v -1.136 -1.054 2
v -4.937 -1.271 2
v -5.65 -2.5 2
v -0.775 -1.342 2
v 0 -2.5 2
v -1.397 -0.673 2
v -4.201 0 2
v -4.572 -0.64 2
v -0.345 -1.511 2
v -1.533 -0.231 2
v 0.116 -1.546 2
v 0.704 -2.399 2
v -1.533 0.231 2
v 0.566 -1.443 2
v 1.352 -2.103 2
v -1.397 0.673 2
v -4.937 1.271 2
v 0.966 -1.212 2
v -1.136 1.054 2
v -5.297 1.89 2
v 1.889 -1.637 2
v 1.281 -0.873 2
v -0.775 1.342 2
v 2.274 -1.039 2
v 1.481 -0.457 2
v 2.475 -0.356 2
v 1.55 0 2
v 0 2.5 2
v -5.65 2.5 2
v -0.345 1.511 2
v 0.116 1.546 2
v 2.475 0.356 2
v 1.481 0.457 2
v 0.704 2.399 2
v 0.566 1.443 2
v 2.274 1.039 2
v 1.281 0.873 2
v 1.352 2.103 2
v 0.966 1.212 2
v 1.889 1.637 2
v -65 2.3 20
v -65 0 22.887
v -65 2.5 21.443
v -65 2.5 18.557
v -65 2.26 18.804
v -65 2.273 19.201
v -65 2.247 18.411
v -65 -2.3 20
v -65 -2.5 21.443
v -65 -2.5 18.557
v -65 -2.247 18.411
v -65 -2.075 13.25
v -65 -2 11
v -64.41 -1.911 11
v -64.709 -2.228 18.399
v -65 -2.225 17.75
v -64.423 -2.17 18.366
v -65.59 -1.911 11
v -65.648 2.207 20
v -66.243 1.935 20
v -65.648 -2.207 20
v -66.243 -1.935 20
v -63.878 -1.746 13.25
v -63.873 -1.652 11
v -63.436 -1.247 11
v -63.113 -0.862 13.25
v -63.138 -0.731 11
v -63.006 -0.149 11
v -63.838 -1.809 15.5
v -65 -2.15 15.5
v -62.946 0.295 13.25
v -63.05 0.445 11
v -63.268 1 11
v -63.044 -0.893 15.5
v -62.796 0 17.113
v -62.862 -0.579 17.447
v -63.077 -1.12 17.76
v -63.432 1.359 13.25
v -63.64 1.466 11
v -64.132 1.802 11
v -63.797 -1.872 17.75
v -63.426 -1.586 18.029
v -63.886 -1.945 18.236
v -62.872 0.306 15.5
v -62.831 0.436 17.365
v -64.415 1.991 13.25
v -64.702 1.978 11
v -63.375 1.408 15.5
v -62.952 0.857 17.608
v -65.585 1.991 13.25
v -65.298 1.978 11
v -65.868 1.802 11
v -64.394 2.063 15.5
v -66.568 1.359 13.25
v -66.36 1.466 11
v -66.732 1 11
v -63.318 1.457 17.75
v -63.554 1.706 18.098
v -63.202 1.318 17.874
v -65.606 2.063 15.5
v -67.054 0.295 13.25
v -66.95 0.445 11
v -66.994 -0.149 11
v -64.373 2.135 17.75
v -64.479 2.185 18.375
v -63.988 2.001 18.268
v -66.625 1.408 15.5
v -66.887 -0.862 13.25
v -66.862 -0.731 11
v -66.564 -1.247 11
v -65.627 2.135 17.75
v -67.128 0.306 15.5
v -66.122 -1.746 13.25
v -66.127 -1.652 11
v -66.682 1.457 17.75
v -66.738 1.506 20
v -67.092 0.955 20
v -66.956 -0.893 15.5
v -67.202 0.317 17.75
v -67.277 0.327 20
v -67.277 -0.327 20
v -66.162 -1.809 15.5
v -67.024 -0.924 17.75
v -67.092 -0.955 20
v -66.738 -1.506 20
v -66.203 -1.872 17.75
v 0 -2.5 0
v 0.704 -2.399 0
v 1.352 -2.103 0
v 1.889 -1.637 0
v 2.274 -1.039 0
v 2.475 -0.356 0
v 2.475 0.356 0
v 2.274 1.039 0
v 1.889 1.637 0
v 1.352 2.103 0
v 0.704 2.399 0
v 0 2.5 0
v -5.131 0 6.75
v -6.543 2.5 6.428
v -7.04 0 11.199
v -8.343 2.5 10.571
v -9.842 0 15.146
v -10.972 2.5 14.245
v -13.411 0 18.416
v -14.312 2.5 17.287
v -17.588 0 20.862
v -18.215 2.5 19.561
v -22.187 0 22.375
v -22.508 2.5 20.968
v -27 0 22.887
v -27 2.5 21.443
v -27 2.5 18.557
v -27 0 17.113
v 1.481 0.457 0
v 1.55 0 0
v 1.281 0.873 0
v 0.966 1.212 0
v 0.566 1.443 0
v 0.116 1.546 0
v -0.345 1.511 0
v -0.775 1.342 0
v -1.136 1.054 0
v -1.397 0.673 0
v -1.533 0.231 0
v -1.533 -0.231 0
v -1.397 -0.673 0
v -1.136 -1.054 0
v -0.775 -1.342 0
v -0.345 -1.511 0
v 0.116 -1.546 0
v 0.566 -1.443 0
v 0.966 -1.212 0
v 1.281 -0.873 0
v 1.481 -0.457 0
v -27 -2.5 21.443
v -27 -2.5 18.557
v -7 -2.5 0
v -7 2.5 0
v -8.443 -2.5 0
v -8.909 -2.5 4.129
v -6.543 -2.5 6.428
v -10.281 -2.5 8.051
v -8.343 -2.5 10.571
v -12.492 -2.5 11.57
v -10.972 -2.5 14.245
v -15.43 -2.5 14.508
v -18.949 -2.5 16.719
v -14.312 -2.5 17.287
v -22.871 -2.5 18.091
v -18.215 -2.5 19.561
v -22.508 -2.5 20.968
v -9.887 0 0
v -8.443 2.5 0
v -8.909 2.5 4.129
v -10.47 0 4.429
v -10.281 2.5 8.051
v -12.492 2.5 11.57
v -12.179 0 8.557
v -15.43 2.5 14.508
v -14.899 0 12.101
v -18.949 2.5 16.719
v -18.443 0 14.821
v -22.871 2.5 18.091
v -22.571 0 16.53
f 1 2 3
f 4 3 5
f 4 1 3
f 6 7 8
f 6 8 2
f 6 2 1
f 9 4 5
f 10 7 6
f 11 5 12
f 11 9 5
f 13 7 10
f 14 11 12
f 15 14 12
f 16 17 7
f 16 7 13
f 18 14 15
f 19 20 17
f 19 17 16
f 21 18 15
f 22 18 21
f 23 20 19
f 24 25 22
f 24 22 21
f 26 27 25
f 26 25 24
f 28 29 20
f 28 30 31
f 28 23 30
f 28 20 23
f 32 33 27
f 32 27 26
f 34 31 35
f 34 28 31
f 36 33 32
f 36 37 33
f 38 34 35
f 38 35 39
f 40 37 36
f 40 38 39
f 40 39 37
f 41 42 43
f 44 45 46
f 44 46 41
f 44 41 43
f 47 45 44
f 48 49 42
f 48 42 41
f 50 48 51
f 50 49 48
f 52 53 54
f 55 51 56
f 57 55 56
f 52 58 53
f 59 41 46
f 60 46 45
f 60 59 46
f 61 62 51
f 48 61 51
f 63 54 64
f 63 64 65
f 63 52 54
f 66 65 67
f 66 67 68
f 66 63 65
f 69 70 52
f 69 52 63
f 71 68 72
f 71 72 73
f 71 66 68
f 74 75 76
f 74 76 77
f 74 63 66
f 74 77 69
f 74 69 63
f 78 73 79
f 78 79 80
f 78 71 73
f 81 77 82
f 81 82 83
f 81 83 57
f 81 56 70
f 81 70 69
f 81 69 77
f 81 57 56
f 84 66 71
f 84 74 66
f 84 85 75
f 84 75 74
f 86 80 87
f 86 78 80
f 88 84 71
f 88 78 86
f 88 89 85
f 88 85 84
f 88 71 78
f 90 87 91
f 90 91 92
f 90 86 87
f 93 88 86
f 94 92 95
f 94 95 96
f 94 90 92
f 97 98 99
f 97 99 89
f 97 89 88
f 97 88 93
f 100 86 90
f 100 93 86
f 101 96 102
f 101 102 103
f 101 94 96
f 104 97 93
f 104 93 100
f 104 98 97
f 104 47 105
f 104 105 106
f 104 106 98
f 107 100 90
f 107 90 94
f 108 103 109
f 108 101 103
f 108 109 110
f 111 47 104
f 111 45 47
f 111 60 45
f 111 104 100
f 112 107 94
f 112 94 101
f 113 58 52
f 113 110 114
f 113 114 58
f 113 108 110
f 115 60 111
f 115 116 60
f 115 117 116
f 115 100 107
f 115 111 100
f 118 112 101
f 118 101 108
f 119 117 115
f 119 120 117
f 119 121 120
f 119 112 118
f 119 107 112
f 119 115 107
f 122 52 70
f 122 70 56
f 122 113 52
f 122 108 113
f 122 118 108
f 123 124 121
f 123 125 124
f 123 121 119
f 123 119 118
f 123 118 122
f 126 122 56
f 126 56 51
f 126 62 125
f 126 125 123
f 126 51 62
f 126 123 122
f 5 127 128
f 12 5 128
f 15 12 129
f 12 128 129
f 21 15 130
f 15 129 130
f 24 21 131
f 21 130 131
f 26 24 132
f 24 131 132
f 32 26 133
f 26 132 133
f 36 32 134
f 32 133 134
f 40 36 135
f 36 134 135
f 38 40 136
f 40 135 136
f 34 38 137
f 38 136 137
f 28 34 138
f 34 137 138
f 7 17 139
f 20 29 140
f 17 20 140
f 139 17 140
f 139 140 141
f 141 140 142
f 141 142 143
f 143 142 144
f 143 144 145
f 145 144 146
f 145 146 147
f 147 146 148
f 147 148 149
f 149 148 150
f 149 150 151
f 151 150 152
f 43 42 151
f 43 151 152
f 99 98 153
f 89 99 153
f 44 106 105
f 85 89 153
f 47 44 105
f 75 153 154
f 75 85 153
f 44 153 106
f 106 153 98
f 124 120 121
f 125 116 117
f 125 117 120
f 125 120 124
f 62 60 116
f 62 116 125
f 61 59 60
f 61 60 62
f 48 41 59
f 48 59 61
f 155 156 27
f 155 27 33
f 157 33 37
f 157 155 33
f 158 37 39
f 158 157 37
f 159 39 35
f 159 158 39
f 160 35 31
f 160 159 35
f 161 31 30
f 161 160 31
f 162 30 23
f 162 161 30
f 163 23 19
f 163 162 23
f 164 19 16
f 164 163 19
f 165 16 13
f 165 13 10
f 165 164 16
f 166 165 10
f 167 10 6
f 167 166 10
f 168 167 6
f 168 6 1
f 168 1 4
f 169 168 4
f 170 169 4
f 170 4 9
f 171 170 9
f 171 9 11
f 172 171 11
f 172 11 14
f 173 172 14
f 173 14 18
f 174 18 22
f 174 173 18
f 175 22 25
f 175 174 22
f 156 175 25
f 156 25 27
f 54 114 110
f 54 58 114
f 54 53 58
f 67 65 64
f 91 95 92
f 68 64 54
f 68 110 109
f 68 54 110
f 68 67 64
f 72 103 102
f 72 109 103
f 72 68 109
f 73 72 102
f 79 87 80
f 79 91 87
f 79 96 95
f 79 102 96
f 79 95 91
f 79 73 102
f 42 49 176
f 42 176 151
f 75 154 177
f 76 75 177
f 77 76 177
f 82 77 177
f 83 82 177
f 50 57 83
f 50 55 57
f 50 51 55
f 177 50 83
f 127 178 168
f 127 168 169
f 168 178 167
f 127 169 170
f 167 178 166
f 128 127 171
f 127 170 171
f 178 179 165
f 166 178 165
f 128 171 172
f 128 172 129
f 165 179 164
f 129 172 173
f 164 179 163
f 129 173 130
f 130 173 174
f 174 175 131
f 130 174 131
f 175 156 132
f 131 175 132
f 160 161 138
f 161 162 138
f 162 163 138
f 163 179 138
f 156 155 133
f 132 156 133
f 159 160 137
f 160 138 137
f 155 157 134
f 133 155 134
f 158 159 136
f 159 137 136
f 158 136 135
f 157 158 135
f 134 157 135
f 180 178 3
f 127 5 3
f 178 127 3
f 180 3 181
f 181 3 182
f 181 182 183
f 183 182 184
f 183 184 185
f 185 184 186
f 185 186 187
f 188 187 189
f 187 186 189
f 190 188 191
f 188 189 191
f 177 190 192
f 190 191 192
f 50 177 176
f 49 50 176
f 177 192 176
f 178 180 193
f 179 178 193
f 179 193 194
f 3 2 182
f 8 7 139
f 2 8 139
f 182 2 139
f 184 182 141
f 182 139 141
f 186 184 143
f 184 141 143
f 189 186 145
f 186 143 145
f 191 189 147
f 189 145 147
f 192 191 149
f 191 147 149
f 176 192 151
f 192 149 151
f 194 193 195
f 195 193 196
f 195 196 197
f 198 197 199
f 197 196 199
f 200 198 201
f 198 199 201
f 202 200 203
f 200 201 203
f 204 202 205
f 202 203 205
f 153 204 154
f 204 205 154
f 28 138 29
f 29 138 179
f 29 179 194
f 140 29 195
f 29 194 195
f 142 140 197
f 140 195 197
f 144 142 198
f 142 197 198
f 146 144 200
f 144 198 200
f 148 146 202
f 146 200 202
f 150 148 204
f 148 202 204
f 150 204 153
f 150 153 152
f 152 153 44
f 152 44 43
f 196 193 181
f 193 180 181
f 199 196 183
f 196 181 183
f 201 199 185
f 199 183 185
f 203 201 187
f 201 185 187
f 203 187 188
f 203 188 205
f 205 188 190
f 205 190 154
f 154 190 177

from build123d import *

# Parameters (mm, degrees)
SKETCH_R  = 1.55
PAD_DEPTH = 2


with BuildPart() as part:
    # Sketch → Pad (new body)
    with BuildSketch(Plane.XY):
        with BuildLine():
            Line((0, 2.5), (-7, 2.5))
            Line((-7, 2.5), (-7, -2.5))
            Line((0, -2.5), (-7, -2.5))
            ThreePointArc((0, -2.5), (2.5, 0), (0, 2.5))
        make_face()
        Circle(SKETCH_R, mode=Mode.SUBTRACT)
    extrude(amount=PAD_DEPTH)

    # AdditivePipe: sweep along a path in Sketch001
    with BuildLine(Plane.XZ) as additivepipe_path:
        ThreePointArc((-7, 0), (-12.857864, 14.142136), (-27, 20))
        Line((-27, 20), (-65, 20))
    # Sketch002 → AdditivePipe (sweep)
    with BuildSketch(Plane.XY):
        Polygon((-8.443376, -2.5), (-5.556624, -2.5), (-4.113249, 0), (-5.556624, 2.5), (-8.443376, 2.5), (-9.886751, 0), align=None)
    sweep(path=additivepipe_path.line)

    # Sketch003 (on Face21 of AdditivePipe) → Revolution (revolve)
    with BuildSketch(Plane(origin=(-65, 0, 0), x_dir=(0, -1, 0), z_dir=(-1, 0, 0))):
        Polygon((0, 20), (0, 11), (2, 11), (2.3, 20), align=None)
    revolve(axis=Axis((-65, 0, 0), (0, 0, 1)))


solid = part.part
